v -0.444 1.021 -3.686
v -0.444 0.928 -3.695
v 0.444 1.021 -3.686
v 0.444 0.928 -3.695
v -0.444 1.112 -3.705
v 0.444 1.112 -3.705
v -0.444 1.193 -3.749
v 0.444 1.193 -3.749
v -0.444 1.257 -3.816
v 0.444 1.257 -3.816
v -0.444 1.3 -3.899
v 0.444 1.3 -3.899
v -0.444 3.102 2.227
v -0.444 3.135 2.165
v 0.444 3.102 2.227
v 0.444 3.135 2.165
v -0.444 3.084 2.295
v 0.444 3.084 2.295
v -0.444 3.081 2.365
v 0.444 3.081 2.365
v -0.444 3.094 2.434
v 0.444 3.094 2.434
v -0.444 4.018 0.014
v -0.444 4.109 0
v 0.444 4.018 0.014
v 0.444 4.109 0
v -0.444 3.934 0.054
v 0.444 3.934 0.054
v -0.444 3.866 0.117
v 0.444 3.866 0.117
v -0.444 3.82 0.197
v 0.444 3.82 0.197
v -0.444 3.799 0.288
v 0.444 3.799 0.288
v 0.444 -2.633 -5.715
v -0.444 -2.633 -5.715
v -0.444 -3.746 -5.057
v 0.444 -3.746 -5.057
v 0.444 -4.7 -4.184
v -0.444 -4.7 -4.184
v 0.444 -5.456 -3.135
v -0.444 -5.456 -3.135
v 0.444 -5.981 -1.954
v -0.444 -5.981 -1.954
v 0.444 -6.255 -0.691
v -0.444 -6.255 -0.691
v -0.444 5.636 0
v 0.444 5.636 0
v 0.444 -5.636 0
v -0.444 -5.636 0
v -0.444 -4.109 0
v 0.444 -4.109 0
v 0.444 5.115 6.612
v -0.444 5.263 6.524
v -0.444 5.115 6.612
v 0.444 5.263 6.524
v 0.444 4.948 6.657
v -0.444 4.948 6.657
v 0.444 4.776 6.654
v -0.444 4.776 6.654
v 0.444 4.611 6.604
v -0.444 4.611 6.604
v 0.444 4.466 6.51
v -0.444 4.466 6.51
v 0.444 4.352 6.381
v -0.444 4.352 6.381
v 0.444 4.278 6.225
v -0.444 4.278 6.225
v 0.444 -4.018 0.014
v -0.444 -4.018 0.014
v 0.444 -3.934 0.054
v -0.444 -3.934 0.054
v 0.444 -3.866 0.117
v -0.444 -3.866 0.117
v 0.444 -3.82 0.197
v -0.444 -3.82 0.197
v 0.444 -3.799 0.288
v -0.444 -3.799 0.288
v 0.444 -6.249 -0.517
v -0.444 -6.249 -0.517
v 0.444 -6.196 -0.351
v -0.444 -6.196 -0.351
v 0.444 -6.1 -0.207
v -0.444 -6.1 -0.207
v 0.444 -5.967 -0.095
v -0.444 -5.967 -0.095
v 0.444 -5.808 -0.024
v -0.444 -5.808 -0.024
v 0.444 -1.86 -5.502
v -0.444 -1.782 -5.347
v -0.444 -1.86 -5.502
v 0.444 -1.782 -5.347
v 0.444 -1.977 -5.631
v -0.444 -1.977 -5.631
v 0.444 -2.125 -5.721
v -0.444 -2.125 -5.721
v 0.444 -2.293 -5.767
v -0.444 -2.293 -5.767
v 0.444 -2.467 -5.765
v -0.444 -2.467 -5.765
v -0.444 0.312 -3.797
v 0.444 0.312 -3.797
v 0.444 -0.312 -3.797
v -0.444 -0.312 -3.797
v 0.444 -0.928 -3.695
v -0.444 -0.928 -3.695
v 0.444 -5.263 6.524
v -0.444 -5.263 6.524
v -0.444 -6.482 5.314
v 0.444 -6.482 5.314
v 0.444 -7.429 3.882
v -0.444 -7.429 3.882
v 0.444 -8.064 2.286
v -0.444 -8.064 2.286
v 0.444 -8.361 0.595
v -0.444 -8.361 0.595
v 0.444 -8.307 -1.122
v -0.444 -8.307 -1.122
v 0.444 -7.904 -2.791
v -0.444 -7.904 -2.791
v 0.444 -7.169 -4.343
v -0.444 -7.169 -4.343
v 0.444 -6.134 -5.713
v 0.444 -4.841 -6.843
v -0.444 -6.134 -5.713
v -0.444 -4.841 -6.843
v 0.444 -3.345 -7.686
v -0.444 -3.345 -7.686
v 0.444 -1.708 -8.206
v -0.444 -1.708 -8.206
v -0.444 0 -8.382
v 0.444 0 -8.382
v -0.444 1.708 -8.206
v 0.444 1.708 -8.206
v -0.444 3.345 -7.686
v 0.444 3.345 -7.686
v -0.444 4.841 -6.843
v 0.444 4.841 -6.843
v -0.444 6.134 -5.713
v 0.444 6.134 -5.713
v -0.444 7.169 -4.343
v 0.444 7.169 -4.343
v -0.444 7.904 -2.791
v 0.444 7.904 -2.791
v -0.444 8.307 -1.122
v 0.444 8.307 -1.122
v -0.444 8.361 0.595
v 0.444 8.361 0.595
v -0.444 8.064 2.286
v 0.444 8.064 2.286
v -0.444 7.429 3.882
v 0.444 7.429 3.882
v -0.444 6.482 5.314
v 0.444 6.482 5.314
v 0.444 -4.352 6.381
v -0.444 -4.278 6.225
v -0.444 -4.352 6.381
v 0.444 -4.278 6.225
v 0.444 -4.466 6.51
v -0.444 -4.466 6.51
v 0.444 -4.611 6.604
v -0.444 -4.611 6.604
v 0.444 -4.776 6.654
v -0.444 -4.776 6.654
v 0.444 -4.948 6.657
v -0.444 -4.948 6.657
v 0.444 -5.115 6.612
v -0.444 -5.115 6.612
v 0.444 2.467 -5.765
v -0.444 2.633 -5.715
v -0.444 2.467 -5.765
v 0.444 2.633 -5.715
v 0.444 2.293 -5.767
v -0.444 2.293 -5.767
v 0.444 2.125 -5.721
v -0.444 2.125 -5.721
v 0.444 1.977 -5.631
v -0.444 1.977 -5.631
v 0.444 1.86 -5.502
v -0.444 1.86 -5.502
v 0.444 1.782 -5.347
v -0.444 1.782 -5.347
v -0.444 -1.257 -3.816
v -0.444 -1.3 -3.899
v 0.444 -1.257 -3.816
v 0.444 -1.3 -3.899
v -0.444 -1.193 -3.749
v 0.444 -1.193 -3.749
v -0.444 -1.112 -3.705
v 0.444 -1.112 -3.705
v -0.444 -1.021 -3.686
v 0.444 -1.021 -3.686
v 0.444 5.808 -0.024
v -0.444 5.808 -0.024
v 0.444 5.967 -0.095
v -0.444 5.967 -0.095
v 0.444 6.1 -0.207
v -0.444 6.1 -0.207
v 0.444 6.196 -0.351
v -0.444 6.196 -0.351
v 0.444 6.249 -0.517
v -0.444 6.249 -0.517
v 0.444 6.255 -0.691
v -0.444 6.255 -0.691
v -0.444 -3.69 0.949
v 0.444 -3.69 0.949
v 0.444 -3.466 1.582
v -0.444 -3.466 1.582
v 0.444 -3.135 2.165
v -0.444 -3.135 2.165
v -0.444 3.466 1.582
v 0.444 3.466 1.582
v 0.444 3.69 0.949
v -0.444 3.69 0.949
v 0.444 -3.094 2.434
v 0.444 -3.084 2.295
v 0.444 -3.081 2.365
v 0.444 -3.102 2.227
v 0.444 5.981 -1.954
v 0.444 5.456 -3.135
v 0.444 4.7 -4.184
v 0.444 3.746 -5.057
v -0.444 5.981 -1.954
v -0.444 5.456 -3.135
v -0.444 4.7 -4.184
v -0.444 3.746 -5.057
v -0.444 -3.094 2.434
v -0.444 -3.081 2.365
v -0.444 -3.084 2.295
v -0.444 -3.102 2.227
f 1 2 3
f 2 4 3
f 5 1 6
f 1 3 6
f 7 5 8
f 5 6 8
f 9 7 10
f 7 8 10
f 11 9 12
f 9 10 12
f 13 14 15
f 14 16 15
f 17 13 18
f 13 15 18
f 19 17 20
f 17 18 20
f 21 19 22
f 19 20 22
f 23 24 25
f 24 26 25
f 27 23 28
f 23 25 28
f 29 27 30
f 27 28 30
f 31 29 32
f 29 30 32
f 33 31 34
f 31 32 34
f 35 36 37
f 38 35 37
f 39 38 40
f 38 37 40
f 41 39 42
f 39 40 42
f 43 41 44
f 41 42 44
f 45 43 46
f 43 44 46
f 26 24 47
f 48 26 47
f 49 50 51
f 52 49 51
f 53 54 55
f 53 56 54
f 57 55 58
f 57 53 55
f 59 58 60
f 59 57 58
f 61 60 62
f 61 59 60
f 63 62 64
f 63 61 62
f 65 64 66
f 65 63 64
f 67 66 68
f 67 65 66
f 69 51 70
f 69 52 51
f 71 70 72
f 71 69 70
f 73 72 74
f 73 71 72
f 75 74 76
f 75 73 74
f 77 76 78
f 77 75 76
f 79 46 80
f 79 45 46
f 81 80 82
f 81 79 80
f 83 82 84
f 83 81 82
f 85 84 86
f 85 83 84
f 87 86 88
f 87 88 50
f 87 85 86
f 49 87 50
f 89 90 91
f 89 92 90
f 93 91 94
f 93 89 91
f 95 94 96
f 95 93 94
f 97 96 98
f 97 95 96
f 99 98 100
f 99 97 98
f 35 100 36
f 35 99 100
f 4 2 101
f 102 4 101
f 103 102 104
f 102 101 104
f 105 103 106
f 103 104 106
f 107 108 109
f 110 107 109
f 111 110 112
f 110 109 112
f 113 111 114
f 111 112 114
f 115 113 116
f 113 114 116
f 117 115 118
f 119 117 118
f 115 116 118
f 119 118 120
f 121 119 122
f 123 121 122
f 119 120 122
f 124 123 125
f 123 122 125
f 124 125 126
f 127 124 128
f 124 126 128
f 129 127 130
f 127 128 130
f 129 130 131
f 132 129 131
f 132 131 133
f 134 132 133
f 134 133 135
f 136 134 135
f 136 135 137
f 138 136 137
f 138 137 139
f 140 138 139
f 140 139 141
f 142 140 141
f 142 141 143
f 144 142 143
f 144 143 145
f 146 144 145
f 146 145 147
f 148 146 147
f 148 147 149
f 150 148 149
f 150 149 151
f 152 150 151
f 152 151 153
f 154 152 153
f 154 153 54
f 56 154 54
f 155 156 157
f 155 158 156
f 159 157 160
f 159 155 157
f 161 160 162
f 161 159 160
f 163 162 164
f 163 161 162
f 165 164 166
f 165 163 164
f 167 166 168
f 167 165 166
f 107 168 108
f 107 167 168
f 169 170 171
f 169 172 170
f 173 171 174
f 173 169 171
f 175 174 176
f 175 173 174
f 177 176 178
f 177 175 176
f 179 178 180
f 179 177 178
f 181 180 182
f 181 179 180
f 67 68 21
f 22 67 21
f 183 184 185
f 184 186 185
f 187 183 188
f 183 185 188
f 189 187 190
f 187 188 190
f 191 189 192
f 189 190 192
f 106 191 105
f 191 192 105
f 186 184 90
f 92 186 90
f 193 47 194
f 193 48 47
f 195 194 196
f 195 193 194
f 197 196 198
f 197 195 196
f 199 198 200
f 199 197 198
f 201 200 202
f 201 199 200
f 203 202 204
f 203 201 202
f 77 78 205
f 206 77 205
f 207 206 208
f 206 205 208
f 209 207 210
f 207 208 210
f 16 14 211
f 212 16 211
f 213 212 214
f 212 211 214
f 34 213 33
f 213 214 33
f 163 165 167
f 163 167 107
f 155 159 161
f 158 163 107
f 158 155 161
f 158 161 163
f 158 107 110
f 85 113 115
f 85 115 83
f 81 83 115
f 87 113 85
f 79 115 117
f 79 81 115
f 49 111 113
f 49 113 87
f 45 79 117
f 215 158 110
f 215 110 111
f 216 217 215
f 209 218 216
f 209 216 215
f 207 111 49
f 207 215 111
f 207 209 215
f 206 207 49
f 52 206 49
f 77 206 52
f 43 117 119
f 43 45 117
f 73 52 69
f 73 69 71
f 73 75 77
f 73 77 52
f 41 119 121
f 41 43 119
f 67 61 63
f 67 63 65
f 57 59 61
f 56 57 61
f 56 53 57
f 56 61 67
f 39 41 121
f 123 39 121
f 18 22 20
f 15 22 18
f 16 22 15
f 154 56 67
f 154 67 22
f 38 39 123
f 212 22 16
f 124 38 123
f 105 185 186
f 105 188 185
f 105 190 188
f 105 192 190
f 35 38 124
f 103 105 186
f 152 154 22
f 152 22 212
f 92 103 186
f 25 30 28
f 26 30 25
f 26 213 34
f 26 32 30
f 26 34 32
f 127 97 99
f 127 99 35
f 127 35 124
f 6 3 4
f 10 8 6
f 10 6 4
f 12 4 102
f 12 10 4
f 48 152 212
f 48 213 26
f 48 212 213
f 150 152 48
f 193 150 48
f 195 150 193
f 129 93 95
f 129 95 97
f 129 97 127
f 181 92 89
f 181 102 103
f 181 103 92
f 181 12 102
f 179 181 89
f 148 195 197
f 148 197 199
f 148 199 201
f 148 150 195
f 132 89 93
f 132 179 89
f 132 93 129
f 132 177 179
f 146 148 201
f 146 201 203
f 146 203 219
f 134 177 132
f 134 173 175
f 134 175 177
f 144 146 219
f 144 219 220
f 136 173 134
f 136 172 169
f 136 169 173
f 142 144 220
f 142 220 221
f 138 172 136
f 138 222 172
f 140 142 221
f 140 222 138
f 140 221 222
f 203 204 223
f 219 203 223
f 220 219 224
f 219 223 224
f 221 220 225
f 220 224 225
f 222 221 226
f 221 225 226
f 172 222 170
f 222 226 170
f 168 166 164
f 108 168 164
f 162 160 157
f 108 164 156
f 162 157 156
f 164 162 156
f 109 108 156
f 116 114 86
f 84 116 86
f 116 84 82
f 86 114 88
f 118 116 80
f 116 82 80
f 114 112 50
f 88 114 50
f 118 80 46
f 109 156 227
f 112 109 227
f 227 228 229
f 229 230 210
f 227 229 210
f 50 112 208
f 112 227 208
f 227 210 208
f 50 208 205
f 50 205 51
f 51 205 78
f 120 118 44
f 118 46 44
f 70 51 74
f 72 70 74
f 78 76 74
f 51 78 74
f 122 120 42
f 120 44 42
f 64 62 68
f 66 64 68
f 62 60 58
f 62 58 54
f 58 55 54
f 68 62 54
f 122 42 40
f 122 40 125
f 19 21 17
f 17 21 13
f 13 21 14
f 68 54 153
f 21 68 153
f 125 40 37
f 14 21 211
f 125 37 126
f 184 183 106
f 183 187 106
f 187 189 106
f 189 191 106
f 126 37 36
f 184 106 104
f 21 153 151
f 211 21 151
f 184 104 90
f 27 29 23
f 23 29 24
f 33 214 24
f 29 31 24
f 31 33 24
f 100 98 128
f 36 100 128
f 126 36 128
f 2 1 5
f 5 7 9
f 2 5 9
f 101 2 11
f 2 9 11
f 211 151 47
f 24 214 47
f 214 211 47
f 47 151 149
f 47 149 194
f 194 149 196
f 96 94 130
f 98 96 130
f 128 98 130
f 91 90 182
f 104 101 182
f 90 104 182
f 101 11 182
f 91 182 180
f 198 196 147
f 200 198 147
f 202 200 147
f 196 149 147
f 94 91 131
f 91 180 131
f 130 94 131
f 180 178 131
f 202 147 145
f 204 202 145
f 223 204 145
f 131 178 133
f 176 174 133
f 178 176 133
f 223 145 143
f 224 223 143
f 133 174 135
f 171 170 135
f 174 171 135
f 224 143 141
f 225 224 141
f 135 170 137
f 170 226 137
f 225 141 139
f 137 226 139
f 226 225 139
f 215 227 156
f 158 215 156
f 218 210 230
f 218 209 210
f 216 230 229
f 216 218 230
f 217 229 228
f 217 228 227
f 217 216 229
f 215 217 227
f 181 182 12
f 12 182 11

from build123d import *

# Parameters (mm, degrees)
BOSS_EXTRUDE1_DEPTH      = 0.4445
BOSS_EXTRUDE1_DEPTH_BACK = 0.4445
FILLET1_R                = 0.6223
FILLET2_R                = 0.31115


with BuildPart() as part:
    # Sketch3 → Boss-Extrude1 (new, two sides: drawn at the far end of the back side and taken through both)
    with BuildSketch(Plane(origin=(0, 0, 0), x_dir=(0, 0, -1), z_dir=(1, 0, 0)).offset(-BOSS_EXTRUDE1_DEPTH_BACK)):
        with BuildLine():
            Line((3.614483366, -1.204827789), (5.969727365, -1.989909122))
            ThreePointArc((5.969727365, -1.989909122), (3.679374344, -5.104859211), (0, -6.292645161))
            Line((0, -6.292645161), (0, -3.81))
            ThreePointArc((0, -3.81), (-1.204827789, -3.614483366), (-2.286, -3.048))
            Line((-2.286, -3.048), (-7.048739855, -4.535767901))
            ThreePointArc((-7.048739855, -4.535767901), (8.382, 0), (-7.048739855, 4.535767901))
            Line((-7.048739855, 4.535767901), (-2.286, 3.048))
            ThreePointArc((-2.286, 3.048), (-1.204827789, 3.614483366), (0, 3.81))
            Line((0, 3.81), (0, 6.292645161))
            ThreePointArc((0, 6.292645161), (3.679374344, 5.104859211), (5.969727365, 1.989909122))
            Line((5.969727365, 1.989909122), (3.614483366, 1.204827789))
            ThreePointArc((3.614483366, 1.204827789), (3.81, 0), (3.614483366, -1.204827789))
        make_face()
    extrude(amount=BOSS_EXTRUDE1_DEPTH + BOSS_EXTRUDE1_DEPTH_BACK)

    # Fillet1
    fillet1_edges = [part.edges().sort_by_distance(p)[0] for p in [
        (0, 1.989909122, -5.969727365),
        (0, 6.292645161, 0),
        (0, 4.535767901, 7.048739855),
        (0, -4.535767901, 7.048739855),
        (0, -6.292645161, 0),
        (0, -1.989909122, -5.969727365),
    ]]
    fillet(fillet1_edges, radius=FILLET1_R)

    # Fillet2
    fillet2_edges = [part.edges().sort_by_distance(p)[0] for p in [
        (0, 1.204827789, -3.614483366),
        (0, 3.81, 0),
        (0, 3.048, 2.286),
        (0, -3.048, 2.286),
        (0, -3.81, 0),
        (0, -1.204827789, -3.614483366),
    ]]
    fillet(fillet2_edges, radius=FILLET2_R)


solid = part.part
